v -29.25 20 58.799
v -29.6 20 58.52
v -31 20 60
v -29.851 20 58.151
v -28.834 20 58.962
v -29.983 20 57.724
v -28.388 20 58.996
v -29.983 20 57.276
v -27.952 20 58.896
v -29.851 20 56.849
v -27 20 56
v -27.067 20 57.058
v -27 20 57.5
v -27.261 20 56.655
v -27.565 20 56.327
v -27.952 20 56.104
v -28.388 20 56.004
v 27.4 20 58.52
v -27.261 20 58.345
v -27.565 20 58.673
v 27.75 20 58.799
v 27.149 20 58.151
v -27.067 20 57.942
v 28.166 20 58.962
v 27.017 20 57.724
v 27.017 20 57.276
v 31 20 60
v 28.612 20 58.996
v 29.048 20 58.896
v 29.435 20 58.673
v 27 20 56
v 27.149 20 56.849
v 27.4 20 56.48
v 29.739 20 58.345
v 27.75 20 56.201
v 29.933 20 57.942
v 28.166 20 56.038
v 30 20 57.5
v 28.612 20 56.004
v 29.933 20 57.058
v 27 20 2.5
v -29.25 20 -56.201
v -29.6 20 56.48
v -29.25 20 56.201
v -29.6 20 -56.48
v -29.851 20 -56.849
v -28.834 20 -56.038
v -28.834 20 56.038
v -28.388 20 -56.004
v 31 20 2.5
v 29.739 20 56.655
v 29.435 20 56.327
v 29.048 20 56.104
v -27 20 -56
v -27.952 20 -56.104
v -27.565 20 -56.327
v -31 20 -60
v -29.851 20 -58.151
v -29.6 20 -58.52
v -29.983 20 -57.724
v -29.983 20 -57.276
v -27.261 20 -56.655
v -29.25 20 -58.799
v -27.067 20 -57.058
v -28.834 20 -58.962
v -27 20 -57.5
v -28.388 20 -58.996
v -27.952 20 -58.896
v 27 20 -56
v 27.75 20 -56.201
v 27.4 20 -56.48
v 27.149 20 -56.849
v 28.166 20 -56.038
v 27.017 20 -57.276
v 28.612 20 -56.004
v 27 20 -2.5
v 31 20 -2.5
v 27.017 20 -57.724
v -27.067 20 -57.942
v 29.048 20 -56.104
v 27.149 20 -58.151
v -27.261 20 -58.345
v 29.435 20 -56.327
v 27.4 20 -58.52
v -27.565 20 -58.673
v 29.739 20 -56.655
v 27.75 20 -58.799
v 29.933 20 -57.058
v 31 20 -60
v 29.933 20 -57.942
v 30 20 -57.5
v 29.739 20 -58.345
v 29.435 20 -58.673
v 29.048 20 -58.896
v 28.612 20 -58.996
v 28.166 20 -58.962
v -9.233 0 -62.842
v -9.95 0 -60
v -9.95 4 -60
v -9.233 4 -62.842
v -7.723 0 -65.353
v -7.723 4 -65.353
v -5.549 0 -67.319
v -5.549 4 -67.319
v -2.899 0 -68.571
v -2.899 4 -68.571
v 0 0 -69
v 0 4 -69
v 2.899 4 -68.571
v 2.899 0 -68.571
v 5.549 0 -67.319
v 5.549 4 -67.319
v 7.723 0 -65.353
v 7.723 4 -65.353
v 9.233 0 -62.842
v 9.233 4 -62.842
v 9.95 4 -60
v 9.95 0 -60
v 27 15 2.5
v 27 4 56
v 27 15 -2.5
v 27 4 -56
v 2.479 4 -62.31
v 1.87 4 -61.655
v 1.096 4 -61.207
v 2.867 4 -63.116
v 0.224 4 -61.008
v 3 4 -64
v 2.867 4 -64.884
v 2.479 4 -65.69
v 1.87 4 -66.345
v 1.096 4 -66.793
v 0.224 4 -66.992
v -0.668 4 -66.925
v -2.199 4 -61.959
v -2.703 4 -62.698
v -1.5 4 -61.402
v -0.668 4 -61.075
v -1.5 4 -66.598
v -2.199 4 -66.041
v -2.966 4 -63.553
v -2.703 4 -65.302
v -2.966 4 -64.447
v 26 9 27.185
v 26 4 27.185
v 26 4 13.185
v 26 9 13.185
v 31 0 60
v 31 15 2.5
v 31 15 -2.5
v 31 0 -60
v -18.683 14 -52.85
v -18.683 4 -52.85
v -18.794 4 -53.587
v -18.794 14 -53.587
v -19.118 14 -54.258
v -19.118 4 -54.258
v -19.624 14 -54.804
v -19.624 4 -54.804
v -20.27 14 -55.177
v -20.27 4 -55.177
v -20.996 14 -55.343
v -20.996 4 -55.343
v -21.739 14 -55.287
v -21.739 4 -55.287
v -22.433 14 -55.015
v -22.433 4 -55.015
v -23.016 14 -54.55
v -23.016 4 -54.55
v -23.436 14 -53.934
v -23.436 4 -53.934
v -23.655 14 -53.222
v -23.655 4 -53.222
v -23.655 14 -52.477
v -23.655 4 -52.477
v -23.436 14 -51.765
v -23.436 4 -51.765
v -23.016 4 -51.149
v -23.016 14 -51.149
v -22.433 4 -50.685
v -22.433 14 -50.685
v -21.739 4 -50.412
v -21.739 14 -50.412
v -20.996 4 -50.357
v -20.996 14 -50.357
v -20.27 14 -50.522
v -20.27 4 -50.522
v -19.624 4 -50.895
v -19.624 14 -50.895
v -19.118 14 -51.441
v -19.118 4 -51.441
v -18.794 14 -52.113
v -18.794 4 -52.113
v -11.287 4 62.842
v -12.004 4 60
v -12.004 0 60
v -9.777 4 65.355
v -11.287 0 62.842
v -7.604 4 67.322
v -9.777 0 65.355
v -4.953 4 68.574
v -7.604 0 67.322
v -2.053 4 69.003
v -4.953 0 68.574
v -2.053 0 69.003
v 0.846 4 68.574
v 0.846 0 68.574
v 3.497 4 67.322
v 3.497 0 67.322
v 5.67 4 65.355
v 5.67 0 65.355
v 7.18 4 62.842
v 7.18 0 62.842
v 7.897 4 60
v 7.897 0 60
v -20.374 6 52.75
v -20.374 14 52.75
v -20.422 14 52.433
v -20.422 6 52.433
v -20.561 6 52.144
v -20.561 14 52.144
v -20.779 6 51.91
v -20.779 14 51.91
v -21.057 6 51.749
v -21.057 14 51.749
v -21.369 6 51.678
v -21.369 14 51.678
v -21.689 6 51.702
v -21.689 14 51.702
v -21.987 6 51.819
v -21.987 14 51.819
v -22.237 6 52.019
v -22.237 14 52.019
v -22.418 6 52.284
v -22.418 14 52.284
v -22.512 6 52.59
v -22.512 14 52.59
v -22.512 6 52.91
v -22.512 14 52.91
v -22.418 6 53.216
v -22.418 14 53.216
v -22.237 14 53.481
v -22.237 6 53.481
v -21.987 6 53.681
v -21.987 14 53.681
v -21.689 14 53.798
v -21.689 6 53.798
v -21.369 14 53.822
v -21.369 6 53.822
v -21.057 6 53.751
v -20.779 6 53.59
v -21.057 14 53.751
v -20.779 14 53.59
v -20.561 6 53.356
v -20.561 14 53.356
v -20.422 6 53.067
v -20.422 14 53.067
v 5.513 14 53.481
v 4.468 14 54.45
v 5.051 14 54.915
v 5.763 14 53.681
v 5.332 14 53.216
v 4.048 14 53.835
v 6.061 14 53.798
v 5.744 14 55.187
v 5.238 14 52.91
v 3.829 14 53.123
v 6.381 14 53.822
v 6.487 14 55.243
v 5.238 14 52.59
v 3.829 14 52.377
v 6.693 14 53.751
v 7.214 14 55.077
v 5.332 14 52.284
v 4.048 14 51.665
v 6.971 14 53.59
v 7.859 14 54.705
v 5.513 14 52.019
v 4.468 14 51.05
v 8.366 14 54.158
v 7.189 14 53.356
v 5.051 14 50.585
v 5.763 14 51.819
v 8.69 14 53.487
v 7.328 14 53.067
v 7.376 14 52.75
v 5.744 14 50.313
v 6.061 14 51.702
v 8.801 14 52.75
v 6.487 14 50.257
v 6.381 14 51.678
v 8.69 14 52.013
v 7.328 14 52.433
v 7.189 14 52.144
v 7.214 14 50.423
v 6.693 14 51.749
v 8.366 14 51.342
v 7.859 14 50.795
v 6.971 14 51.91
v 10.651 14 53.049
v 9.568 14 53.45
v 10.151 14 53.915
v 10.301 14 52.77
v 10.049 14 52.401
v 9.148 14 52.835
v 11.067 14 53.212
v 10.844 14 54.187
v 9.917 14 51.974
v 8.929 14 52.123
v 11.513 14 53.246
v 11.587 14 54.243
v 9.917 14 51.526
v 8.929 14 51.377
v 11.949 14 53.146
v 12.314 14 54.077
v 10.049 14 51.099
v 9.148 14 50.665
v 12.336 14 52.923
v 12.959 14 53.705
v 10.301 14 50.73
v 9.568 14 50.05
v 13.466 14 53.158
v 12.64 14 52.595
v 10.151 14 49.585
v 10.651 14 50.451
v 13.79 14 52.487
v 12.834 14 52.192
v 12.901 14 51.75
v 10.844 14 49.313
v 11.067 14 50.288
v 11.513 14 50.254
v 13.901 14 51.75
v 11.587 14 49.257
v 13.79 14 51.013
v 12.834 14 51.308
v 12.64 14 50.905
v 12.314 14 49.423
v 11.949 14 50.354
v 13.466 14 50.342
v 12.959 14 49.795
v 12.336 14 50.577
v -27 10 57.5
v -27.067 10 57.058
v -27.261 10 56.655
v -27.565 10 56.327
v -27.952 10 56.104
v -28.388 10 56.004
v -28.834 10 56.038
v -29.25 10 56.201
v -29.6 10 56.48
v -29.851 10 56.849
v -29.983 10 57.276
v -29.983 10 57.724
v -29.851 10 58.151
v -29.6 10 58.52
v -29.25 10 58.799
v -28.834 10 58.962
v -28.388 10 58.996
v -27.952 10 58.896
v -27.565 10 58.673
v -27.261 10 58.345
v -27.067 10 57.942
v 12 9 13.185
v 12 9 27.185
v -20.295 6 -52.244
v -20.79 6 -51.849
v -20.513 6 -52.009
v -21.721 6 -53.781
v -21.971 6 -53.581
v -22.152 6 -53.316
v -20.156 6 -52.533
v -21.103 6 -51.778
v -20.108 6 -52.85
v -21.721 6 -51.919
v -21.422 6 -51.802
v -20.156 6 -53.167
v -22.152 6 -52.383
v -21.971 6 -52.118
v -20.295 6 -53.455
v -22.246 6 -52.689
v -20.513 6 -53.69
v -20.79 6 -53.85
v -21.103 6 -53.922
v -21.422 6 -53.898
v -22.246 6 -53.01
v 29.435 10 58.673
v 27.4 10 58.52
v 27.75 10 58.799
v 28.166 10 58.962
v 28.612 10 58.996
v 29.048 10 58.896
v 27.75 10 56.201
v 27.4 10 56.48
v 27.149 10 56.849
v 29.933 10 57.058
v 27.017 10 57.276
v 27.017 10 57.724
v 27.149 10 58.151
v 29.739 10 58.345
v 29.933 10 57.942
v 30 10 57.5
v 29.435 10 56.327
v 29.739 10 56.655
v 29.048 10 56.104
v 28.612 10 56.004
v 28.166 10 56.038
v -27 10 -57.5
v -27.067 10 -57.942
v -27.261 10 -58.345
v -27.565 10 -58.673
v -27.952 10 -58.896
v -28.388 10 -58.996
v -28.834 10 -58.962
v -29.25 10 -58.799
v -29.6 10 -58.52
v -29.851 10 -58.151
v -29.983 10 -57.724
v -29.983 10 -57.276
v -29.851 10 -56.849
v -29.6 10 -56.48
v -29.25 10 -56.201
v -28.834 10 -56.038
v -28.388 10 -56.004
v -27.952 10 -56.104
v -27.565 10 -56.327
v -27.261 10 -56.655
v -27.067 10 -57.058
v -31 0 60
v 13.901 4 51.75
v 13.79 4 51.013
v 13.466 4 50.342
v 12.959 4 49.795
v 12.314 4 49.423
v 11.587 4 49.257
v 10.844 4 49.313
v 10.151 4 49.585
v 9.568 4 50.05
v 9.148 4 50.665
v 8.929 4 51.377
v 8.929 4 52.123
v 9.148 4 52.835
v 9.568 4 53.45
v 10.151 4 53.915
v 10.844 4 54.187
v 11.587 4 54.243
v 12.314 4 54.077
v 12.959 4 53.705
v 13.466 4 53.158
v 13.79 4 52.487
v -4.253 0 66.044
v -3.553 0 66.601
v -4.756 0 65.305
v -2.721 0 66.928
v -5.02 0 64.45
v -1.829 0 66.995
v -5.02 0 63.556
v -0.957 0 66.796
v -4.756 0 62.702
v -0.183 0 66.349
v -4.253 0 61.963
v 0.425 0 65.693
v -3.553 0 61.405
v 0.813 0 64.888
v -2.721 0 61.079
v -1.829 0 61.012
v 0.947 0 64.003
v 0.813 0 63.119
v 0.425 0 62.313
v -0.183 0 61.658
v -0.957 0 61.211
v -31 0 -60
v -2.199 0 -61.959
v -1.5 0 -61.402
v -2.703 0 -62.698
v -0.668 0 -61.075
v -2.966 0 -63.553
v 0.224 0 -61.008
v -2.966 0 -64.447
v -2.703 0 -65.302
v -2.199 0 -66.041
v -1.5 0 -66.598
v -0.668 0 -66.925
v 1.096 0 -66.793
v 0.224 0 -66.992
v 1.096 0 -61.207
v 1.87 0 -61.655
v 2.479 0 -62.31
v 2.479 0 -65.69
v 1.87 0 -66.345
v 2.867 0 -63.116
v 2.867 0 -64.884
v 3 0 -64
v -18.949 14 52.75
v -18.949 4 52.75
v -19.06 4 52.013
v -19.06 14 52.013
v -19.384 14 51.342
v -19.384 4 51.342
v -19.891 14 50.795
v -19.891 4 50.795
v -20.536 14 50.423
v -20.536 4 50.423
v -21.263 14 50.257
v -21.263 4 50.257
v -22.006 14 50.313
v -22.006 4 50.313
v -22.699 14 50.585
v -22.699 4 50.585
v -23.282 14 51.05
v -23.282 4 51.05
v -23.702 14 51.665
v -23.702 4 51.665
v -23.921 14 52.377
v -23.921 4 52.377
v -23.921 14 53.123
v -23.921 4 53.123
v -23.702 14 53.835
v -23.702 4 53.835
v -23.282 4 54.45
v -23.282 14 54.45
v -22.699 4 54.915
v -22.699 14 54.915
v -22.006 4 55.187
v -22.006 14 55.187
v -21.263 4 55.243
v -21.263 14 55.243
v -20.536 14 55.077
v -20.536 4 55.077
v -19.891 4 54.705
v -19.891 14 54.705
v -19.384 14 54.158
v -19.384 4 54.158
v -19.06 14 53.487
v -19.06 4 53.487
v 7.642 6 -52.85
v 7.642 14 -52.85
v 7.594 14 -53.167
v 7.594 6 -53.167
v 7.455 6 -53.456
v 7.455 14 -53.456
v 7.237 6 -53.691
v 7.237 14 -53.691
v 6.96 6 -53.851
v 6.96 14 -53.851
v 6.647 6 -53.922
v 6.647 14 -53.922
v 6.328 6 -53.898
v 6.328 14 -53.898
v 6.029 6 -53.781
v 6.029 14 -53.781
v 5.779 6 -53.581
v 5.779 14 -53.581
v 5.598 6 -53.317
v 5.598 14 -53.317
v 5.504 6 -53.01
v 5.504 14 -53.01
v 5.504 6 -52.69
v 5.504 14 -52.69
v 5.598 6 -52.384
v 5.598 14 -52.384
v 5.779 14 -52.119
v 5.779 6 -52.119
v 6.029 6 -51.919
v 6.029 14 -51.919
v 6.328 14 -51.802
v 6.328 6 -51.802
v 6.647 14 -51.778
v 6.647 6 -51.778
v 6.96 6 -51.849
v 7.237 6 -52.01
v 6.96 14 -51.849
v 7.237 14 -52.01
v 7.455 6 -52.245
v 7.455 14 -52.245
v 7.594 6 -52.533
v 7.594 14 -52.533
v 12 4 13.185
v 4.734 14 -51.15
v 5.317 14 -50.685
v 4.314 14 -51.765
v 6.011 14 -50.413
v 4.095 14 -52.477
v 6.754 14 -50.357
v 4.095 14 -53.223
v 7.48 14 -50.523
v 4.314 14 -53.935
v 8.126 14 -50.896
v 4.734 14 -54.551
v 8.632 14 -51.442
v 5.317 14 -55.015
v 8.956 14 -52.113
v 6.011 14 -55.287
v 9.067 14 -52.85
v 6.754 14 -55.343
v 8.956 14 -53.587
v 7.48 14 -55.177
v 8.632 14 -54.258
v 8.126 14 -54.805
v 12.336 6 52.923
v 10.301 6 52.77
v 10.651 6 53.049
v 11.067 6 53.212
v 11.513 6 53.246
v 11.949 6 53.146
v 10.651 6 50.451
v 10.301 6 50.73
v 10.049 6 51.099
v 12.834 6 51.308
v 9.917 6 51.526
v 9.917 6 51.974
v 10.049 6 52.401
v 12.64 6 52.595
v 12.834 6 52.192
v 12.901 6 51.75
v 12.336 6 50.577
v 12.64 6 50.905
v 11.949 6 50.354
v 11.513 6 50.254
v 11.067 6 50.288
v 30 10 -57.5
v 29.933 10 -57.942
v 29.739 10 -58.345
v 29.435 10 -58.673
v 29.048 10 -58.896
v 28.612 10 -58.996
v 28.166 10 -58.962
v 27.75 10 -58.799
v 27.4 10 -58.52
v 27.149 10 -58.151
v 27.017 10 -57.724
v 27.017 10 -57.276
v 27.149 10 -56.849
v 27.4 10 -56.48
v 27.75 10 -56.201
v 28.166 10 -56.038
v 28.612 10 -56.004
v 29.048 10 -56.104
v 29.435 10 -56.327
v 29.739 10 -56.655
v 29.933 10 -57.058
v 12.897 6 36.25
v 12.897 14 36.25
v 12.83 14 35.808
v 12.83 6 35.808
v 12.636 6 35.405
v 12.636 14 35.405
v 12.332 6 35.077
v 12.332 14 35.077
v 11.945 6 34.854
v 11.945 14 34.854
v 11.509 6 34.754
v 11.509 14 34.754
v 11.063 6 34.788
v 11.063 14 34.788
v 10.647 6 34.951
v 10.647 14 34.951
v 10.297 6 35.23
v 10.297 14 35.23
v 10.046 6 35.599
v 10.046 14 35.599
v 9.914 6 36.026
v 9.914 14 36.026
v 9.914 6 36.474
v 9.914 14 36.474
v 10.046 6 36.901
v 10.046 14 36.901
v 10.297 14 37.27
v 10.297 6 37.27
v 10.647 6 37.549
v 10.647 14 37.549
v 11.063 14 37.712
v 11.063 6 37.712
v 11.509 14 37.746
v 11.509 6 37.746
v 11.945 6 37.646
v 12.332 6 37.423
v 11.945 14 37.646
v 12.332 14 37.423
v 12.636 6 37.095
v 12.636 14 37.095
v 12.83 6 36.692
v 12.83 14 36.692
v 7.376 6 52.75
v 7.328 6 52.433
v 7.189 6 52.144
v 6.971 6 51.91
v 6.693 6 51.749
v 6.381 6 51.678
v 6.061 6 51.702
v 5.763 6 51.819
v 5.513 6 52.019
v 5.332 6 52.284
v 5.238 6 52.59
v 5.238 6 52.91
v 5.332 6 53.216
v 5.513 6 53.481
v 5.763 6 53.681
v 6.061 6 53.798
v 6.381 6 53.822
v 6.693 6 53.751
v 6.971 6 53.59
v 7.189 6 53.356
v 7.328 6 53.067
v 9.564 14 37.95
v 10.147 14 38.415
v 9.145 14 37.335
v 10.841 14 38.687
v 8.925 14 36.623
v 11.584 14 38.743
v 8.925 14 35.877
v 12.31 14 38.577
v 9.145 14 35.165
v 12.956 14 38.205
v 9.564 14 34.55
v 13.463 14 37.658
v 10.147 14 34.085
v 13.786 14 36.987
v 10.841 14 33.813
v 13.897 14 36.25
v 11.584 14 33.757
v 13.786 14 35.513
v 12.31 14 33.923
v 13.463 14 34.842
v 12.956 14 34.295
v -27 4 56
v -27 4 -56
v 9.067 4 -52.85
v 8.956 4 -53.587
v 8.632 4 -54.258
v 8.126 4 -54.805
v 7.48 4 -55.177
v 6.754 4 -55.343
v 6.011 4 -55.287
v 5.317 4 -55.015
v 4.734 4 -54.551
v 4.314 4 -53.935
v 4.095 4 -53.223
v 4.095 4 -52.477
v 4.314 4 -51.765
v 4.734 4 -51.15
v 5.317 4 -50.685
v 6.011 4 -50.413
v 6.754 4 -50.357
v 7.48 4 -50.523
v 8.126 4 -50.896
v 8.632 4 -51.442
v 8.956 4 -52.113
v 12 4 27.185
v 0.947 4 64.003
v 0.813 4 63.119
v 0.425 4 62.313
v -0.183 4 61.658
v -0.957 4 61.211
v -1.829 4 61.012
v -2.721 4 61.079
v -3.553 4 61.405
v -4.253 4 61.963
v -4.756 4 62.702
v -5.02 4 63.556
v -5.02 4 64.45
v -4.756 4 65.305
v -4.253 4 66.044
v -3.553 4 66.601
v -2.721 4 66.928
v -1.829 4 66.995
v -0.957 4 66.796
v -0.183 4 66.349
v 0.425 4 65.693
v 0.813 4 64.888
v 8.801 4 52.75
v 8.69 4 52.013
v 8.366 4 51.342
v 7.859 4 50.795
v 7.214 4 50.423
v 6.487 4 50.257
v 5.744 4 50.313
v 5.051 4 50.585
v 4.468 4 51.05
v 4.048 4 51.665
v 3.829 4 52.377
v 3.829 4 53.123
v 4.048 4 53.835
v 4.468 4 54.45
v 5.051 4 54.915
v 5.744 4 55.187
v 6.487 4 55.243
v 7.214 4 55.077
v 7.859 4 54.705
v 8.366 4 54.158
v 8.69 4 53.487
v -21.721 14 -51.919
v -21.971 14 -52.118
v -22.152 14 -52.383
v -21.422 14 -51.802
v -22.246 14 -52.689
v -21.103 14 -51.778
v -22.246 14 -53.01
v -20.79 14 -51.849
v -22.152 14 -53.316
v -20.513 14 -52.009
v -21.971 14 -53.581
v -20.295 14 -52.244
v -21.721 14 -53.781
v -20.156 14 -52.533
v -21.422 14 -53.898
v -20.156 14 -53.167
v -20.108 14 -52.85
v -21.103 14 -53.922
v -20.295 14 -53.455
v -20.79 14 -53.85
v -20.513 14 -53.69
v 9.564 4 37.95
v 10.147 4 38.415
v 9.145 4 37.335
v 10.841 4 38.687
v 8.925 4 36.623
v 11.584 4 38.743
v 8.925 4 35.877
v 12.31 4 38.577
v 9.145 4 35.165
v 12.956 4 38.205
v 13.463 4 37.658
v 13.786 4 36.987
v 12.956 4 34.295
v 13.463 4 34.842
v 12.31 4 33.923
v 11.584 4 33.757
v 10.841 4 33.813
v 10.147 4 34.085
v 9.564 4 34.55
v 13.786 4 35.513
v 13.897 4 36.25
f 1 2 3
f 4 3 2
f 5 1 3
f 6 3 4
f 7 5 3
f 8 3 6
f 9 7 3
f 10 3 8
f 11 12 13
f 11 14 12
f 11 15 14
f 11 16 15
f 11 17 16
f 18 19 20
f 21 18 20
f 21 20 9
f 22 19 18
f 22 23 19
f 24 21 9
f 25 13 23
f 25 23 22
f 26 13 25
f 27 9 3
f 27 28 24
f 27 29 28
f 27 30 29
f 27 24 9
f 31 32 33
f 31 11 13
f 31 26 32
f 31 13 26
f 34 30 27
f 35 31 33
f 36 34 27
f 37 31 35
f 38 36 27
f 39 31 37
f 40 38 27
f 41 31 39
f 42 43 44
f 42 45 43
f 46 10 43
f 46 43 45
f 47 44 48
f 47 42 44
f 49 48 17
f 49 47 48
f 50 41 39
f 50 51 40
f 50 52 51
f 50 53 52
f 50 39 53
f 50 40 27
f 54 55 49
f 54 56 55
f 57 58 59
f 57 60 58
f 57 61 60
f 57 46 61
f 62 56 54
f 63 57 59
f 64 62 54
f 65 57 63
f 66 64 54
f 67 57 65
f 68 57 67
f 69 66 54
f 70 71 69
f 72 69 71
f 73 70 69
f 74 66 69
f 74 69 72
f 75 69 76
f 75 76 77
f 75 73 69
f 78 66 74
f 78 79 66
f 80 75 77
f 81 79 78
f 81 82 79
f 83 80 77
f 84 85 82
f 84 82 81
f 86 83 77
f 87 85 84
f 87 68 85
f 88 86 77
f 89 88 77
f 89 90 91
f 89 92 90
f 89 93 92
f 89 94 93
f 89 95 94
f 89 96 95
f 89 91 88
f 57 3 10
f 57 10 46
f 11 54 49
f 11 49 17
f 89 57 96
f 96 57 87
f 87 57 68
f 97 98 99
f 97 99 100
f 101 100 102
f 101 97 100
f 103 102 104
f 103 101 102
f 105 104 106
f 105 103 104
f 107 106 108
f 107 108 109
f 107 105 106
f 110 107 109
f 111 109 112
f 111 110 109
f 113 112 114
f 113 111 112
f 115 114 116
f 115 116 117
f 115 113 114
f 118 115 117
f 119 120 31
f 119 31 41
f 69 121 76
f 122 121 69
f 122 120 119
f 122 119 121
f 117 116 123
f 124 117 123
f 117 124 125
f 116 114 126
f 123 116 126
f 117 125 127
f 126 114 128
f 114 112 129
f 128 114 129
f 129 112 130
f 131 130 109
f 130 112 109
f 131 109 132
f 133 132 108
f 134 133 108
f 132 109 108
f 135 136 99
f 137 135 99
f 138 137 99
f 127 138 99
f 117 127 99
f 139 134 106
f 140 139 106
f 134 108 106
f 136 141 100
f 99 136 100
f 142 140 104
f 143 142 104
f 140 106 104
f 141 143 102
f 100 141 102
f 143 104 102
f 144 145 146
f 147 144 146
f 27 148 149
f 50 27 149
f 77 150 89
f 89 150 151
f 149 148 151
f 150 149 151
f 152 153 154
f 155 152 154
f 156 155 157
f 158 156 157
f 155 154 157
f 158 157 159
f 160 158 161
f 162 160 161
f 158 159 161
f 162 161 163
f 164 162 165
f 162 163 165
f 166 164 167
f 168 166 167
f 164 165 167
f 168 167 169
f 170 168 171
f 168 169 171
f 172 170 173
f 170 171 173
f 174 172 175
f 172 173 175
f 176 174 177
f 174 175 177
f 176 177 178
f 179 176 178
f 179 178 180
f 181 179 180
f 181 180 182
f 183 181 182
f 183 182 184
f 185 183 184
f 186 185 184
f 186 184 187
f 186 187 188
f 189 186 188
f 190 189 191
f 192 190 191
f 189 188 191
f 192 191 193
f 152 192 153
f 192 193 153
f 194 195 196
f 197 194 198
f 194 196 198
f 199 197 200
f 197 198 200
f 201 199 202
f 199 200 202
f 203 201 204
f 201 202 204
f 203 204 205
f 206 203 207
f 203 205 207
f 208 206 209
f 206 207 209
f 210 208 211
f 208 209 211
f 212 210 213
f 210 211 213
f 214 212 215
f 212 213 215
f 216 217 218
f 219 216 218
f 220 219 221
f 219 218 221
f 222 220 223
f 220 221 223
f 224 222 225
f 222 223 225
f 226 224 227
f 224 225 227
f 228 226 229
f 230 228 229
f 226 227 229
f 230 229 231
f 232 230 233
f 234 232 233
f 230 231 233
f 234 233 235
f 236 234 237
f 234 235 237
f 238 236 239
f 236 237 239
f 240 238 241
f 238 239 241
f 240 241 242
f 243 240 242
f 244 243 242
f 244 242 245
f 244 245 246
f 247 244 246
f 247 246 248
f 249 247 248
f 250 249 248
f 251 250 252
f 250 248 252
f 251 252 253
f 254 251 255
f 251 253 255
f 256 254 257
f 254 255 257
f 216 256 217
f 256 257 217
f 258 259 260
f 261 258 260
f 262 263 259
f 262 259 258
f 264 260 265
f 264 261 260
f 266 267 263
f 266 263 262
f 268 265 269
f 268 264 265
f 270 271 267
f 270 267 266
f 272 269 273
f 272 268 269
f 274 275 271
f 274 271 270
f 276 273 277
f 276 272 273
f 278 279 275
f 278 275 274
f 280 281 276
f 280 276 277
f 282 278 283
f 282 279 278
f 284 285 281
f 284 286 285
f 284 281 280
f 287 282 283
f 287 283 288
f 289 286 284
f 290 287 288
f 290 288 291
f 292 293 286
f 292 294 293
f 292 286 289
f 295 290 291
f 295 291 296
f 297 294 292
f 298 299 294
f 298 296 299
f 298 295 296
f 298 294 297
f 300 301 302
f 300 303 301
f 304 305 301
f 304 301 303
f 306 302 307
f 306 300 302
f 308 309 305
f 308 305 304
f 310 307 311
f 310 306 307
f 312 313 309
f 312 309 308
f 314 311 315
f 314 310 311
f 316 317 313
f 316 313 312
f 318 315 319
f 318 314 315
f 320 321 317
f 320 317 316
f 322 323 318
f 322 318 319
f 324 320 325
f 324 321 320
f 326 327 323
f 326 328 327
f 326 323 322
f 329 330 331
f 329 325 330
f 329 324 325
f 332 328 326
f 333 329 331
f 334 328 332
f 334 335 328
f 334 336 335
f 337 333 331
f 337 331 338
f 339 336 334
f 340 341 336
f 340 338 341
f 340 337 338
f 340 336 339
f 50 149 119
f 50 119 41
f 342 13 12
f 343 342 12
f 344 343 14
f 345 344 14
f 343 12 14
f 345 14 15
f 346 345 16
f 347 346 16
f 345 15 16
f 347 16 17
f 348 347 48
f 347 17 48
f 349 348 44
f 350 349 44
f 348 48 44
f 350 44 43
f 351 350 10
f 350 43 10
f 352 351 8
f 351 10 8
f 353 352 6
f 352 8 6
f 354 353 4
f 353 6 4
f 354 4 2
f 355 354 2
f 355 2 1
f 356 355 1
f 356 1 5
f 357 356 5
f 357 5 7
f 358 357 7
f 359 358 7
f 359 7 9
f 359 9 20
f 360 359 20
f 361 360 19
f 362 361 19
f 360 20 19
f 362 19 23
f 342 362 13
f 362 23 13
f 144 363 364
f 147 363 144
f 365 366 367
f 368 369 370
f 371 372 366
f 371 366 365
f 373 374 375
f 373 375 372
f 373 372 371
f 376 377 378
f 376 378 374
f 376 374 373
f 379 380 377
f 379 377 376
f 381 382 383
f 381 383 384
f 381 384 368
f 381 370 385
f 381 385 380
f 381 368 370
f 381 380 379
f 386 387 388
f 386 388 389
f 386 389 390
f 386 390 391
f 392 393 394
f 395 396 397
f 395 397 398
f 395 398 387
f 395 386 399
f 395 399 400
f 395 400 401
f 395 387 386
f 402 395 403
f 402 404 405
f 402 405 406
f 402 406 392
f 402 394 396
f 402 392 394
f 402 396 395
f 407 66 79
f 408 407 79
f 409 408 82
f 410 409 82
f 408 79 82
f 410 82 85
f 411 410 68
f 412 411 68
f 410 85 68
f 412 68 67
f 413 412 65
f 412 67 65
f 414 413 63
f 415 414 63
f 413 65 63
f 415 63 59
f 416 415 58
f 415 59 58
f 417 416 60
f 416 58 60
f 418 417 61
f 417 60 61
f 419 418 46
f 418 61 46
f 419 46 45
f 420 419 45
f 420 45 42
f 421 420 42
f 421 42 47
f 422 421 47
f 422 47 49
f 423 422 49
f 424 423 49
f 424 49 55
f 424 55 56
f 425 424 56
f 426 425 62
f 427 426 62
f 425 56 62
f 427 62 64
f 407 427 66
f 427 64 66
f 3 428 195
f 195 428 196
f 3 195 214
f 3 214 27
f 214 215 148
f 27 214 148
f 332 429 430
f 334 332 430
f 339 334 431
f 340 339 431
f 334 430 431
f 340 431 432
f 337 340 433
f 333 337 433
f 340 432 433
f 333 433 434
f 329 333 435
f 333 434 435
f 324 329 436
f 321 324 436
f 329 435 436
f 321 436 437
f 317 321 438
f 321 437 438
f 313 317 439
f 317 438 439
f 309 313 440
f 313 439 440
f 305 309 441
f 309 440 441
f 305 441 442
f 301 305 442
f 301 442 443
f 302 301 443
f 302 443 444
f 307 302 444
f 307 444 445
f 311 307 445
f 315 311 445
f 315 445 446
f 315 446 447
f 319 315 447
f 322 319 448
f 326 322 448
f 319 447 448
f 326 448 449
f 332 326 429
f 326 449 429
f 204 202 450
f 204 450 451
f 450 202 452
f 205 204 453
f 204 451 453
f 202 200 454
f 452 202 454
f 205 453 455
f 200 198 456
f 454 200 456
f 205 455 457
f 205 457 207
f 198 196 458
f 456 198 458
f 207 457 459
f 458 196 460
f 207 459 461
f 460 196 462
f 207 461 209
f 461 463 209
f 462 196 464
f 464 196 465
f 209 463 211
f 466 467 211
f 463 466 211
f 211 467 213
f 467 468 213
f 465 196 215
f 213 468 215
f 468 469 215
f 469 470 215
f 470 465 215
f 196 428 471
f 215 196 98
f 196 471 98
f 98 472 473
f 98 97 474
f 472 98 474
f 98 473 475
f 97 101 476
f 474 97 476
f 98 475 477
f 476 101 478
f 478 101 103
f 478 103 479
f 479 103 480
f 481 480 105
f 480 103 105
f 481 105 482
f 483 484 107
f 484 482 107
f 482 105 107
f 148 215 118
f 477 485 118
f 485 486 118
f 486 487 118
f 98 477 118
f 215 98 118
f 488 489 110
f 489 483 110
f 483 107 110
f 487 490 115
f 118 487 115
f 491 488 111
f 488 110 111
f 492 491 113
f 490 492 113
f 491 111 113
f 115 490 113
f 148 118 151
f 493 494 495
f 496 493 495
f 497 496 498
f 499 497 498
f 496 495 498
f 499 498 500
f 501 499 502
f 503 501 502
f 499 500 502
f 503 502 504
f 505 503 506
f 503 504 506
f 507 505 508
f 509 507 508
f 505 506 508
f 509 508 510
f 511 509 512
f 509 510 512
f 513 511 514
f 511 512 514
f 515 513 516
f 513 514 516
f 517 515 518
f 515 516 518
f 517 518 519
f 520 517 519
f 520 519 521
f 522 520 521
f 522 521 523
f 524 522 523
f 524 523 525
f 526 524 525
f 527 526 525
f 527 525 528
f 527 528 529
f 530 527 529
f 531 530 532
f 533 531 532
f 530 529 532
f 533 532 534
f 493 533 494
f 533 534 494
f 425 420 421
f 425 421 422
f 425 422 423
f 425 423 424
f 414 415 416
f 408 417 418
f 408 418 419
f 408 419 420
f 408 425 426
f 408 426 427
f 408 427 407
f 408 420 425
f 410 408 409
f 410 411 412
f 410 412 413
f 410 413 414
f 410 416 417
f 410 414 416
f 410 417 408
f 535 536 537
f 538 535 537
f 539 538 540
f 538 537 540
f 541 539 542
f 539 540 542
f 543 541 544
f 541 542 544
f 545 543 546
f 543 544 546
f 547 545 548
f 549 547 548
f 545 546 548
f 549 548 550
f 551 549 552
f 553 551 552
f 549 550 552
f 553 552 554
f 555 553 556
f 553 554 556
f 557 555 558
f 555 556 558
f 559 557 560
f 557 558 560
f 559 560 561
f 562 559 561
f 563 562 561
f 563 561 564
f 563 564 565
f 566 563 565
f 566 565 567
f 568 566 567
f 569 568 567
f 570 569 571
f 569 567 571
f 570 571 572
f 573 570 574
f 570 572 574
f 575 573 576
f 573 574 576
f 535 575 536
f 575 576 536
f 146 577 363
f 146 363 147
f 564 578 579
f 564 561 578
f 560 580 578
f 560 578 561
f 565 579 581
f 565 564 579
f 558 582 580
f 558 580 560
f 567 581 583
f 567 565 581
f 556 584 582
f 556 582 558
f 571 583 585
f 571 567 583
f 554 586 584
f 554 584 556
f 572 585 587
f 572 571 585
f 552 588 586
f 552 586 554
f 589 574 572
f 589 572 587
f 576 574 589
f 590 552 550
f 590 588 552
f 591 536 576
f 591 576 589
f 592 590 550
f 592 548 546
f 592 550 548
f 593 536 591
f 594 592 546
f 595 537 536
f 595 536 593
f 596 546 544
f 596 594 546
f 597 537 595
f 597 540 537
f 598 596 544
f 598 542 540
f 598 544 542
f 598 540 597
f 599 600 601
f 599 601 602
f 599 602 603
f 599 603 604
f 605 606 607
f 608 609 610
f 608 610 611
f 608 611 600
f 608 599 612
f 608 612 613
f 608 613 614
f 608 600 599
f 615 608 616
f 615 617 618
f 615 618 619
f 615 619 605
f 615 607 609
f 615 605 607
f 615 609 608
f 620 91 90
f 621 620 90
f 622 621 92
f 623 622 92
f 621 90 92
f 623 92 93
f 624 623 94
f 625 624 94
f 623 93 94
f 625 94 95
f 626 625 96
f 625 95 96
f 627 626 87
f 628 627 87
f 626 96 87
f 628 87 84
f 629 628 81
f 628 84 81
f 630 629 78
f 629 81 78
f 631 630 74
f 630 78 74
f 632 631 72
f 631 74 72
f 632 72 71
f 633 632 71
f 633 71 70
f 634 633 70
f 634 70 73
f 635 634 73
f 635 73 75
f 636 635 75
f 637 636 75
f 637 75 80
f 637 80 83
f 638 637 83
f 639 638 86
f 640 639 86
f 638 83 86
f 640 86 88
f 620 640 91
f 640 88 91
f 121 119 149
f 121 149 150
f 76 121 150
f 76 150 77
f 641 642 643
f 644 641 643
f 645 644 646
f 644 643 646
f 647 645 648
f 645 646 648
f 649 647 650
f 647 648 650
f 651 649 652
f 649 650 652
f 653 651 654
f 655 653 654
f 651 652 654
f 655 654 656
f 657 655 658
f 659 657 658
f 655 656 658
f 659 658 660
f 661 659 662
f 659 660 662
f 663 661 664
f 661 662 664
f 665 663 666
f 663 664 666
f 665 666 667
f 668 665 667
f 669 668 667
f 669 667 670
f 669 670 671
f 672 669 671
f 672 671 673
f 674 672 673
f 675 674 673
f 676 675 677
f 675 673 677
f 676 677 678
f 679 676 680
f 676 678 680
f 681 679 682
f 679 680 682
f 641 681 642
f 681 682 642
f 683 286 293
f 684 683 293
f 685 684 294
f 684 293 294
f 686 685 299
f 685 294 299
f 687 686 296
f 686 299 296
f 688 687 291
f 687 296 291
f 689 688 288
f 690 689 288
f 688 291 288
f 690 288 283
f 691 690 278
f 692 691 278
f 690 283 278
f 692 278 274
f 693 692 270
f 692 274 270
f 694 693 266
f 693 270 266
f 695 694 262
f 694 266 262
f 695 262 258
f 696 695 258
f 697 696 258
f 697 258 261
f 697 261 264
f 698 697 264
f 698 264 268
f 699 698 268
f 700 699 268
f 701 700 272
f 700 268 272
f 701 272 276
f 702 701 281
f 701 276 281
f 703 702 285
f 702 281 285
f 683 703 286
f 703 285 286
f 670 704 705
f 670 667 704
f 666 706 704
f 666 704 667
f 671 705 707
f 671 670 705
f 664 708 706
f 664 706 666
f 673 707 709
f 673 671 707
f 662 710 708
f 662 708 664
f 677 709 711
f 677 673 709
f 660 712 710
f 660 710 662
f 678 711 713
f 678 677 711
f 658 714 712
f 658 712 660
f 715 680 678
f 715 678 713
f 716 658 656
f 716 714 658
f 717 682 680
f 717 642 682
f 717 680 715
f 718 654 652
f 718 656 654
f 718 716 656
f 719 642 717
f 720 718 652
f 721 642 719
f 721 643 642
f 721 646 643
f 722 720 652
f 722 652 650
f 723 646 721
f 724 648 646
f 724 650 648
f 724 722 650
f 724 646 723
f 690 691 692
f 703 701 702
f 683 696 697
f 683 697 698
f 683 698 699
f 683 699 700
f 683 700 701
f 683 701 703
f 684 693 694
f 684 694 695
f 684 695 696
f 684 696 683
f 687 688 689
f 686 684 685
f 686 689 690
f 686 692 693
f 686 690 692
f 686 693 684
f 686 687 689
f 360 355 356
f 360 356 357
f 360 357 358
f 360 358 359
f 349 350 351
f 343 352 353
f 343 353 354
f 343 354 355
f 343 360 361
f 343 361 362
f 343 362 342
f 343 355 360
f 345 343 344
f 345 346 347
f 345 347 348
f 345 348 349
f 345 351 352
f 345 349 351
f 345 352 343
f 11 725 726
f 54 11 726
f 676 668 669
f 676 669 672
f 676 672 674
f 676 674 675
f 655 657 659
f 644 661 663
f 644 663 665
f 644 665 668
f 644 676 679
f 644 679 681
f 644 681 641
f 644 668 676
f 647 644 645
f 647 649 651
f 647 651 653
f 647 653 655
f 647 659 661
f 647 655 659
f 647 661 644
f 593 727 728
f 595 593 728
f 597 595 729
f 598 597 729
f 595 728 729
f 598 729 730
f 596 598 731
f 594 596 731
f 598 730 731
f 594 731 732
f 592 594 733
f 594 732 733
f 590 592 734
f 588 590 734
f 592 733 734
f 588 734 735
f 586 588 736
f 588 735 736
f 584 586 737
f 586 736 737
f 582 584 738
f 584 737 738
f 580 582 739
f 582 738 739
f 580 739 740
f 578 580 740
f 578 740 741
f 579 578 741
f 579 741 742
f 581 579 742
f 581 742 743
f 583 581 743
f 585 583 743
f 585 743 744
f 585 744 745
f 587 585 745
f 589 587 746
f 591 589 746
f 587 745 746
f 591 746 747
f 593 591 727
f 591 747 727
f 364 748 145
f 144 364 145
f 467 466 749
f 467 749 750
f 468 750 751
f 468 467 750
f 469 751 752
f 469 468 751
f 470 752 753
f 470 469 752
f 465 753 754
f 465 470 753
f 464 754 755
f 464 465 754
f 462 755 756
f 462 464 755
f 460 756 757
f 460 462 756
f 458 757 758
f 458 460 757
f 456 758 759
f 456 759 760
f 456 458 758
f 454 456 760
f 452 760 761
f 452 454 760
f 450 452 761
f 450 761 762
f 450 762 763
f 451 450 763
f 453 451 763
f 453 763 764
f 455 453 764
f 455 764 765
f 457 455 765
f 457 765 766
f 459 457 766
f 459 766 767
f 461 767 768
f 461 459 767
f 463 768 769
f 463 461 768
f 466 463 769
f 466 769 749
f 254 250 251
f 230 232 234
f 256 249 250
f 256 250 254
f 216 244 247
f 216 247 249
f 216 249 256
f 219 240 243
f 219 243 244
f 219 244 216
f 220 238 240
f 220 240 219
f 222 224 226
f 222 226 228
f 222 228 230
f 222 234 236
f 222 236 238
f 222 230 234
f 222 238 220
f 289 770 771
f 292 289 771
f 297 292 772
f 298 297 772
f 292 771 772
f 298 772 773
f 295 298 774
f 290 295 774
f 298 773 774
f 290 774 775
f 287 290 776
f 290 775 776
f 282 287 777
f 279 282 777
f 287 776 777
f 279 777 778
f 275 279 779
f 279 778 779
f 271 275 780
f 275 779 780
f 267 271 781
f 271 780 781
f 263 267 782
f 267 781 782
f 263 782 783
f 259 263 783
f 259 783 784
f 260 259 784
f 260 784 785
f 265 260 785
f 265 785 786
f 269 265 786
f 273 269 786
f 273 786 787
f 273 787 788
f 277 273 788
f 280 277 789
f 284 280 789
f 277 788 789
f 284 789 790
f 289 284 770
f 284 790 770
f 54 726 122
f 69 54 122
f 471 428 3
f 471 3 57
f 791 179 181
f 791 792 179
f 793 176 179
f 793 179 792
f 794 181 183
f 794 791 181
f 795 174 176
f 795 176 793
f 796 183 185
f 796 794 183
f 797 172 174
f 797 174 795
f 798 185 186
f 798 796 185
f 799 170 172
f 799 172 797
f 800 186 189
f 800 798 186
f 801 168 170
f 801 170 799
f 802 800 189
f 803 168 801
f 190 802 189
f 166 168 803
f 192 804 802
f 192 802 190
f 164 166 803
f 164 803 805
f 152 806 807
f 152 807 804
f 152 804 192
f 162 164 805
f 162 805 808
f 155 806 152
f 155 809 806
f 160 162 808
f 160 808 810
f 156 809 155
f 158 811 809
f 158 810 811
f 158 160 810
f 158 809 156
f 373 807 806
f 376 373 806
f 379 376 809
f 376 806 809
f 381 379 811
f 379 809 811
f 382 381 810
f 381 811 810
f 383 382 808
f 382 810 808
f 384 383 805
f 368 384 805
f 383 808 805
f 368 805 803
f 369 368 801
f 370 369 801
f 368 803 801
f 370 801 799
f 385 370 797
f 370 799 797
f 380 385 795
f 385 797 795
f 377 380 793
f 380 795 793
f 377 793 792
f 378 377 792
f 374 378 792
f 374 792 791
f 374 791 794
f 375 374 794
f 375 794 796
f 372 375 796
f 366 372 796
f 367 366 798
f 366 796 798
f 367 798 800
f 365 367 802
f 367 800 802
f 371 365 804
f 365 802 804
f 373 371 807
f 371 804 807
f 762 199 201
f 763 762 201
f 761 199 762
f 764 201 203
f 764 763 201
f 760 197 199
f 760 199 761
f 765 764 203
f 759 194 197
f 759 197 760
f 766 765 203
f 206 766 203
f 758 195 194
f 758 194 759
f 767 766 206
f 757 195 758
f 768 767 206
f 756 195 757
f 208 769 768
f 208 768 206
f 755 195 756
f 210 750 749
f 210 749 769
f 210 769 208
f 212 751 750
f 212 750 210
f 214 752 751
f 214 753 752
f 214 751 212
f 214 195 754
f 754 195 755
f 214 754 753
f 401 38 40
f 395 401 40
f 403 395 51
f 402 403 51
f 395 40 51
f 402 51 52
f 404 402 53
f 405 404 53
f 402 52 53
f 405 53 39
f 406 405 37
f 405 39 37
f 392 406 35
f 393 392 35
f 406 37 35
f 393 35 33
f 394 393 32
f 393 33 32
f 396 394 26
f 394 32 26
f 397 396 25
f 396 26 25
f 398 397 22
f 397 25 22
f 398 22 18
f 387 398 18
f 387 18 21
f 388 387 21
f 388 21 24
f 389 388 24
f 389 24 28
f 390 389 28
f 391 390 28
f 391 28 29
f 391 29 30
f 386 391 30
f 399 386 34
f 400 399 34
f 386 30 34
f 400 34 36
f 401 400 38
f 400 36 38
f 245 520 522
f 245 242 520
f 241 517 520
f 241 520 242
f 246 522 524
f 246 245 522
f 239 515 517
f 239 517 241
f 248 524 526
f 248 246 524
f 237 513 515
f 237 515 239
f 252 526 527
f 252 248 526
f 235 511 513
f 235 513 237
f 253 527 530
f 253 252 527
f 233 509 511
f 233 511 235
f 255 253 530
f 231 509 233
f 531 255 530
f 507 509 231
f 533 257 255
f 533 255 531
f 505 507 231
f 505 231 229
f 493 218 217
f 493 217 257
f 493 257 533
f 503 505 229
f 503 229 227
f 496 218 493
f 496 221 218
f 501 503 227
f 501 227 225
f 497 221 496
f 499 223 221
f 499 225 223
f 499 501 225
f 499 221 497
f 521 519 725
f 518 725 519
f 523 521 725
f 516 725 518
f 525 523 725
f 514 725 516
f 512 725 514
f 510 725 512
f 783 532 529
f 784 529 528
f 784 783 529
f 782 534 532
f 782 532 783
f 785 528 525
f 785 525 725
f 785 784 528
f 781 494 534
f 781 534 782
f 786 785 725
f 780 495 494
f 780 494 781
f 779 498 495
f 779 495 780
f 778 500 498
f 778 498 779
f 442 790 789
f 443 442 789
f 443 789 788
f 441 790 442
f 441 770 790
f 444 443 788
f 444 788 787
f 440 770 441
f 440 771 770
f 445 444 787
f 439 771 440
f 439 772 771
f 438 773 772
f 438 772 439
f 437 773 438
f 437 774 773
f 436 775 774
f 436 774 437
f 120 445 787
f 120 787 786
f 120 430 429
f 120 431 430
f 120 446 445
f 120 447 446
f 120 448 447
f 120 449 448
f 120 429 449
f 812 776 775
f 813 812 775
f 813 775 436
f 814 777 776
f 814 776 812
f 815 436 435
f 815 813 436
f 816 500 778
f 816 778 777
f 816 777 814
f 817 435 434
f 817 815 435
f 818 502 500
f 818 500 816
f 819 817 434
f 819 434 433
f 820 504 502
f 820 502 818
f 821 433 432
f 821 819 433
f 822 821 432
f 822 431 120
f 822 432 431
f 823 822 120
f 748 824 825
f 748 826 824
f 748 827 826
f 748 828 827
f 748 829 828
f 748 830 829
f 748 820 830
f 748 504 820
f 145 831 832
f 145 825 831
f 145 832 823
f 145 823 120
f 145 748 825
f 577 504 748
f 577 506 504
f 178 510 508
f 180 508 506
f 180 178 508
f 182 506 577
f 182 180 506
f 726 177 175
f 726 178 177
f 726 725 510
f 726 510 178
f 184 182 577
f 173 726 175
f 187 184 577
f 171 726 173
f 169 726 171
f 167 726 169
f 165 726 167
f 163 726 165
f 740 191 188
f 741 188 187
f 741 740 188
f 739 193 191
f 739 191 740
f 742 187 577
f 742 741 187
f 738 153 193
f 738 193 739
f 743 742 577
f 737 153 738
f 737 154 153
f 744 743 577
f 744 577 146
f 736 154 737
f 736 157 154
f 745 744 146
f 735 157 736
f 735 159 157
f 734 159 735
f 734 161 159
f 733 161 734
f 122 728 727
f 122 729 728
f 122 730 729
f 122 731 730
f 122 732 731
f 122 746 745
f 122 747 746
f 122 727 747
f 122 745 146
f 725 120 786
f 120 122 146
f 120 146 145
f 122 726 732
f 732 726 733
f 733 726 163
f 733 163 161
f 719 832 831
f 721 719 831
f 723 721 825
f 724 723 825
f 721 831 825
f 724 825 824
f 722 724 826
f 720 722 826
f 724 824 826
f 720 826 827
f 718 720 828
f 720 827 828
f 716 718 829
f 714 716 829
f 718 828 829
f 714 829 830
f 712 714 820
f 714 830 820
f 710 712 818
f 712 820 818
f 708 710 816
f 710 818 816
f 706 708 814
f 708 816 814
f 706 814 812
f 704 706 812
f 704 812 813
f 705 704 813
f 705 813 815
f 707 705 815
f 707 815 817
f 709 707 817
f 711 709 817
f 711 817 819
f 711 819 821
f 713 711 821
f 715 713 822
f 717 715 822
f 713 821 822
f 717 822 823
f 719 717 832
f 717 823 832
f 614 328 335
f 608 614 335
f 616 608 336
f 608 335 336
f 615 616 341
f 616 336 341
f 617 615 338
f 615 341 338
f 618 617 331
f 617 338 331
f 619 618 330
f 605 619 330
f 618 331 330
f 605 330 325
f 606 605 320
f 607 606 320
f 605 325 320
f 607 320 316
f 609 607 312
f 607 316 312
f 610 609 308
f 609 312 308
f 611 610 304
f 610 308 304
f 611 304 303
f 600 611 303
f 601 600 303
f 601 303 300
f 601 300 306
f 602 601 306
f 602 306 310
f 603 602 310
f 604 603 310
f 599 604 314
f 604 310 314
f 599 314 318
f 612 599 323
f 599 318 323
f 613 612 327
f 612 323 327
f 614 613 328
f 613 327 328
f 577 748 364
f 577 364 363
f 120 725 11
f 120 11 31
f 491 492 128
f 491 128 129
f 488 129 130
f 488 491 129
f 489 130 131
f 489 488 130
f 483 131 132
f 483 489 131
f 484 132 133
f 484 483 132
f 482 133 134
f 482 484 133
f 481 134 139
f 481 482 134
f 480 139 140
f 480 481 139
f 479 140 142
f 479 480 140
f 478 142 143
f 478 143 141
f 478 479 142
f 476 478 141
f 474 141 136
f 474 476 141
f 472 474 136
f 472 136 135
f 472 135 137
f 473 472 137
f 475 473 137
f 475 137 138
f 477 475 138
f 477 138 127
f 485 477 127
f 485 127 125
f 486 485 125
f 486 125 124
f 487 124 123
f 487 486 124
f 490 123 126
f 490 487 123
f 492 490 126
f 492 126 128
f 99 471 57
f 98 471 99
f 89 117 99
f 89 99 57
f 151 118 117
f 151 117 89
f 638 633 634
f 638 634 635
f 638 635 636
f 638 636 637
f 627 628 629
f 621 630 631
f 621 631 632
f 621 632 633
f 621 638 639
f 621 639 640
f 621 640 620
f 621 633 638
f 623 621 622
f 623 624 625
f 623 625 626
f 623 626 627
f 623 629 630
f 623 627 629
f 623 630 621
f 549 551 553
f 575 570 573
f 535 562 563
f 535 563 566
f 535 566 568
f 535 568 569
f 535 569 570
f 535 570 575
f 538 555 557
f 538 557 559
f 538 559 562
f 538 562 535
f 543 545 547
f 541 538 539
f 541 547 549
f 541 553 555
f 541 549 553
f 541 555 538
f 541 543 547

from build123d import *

# Parameters (mm, degrees)
SKETCH1_W                      = 60
SKETCH1_H                      = 118
BOSS_EXTRUDE1_DEPTH            = 4
SKETCH2_R                      = 2.5
BOSS_EXTRUDE2_DEPTH            = 10
SKETCH3_R                      = 1.075
SKETCH3_R_2                    = 1.5
CUT_EXTRUDE1_DEPTH             = 8
SKETCH4_W                      = 14
SKETCH4_H                      = 14
BOSS_EXTRUDE3_DEPTH            = 5
SKETCH5_W                      = 60
SKETCH5_H                      = 118
SKETCH5_W_2                    = 54
SKETCH5_H_2                    = 112
BOSS_EXTRUDE4_DEPTH            = 16
SKETCH10_W                     = 62
SKETCH10_H                     = 120
SKETCH10_W_2                   = 60
SKETCH10_H_2                   = 118
BOSS_EXTRUDE7_DEPTH            = 20
SKETCH6_R                      = 1.5
CUT_EXTRUDE2_DEPTH             = 10
CUT_EXTRUDE3_REACH             = 63
SKETCH7_W                      = 5
SKETCH7_H                      = 10
CUT_EXTRUDE3_DIRECTION_2_DEPTH = 10
SKETCH8_R                      = 3
BOSS_EXTRUDE5_DEPTH            = 4


with BuildPart() as part:
    # Sketch1 → Boss-Extrude1 (new body)
    with BuildSketch(Plane(origin=(0, 0, 0), x_dir=(1, 0, 0), z_dir=(0, 1, 0))):
        Rectangle(SKETCH1_W, SKETCH1_H)
    extrude(amount=BOSS_EXTRUDE1_DEPTH)

    # Sketch2 → Boss-Extrude2 (add)
    with BuildSketch(Plane(origin=(0, 4, 0), x_dir=(1, 0, 0), z_dir=(0, 1, 0))):
        with Locations((-21.18316549, 52.849664436)):
            Circle(SKETCH2_R)
        with Locations((6.566834506, 52.850079416)):
            Circle(SKETCH2_R)
        with Locations((-21.449381738, -52.75)):
            Circle(SKETCH2_R)
        with Locations((6.300617416, -52.75)):
            Circle(SKETCH2_R)
        with Locations((11.396968897, -36.250000429)):
            Circle(SKETCH2_R)
        with Locations((11.400617416, -51.75)):
            Circle(SKETCH2_R)
    extrude(amount=BOSS_EXTRUDE2_DEPTH)

    # Sketch3 → Cut-Extrude1 (cut)
    with BuildSketch(Plane(origin=(0, 14, 0), x_dir=(1, 0, 0), z_dir=(0, 1, 0))):
        with Locations((-21.18316549, 52.849664436)):
            Circle(SKETCH3_R)
        with Locations((6.566834506, 52.850079416)):
            Circle(SKETCH3_R)
        with Locations((11.396968897, -36.250000429)):
            Circle(SKETCH3_R_2)
        with Locations((11.400617416, -51.75)):
            Circle(SKETCH3_R_2)
        with Locations((6.300617416, -52.75)):
            Circle(SKETCH3_R)
        with Locations((-21.449381738, -52.75)):
            Circle(SKETCH3_R)
    extrude(amount=-CUT_EXTRUDE1_DEPTH, mode=Mode.SUBTRACT)

    # Sketch4 → Boss-Extrude3 (add)
    with BuildSketch(Plane(origin=(0, 4, 0), x_dir=(1, 0, 0), z_dir=(0, 1, 0))):
        with Locations((19, -20.184694787)):
            Rectangle(SKETCH4_W, SKETCH4_H)
    extrude(amount=BOSS_EXTRUDE3_DEPTH)

    # Sketch5 → Boss-Extrude4 (add)
    with BuildSketch(Plane(origin=(0, 4, 0), x_dir=(1, 0, 0), z_dir=(0, 1, 0))):
        Rectangle(SKETCH5_W, SKETCH5_H)
        Rectangle(SKETCH5_W_2, SKETCH5_H_2, mode=Mode.SUBTRACT)
    extrude(amount=BOSS_EXTRUDE4_DEPTH)

    # Sketch10 → Boss-Extrude7 (add)
    with BuildSketch(Plane(origin=(0, 0, 0), x_dir=(1, 0, 0), z_dir=(0, 1, 0))):
        Rectangle(SKETCH10_W, SKETCH10_H)
        Rectangle(SKETCH10_W_2, SKETCH10_H_2, mode=Mode.SUBTRACT)
    extrude(amount=BOSS_EXTRUDE7_DEPTH)

    # Sketch6 → Cut-Extrude2 (cut)
    with BuildSketch(Plane(origin=(0, 20, 0), x_dir=(1, 0, 0), z_dir=(0, 1, 0))):
        with Locations((-28.5, 57.5)):
            Circle(SKETCH6_R)
        with Locations((28.5, 57.5)):
            Circle(SKETCH6_R)
        with Locations((-28.5, -57.5)):
            Circle(SKETCH6_R)
        with Locations((28.5, -57.5)):
            Circle(SKETCH6_R)
    extrude(amount=-CUT_EXTRUDE2_DEPTH, mode=Mode.SUBTRACT)

    # Sketch7 → Cut-Extrude3 (cut, up to next)
    with BuildSketch(Plane(origin=(30, 0, 0), x_dir=(0, 0, -1), z_dir=(1, 0, 0)), mode=Mode.PRIVATE) as cut_extrude3_sk1:
        with Locations((0, 20)):
            Rectangle(SKETCH7_W, SKETCH7_H)
    cut_extrude3_tool1 = extrude(cut_extrude3_sk1.sketch, amount=-CUT_EXTRUDE3_REACH, mode=Mode.PRIVATE) & part.part
    add(cut_extrude3_tool1.solids().sort_by_distance((30, 20, 0))[0], mode=Mode.SUBTRACT)

    # Sketch7 → Cut-Extrude3 direction 2 (cut)
    with BuildSketch(Plane(origin=(30, 0, 0), x_dir=(0, 0, -1), z_dir=(1, 0, 0))):
        with Locations((0, 20)):
            Rectangle(SKETCH7_W, SKETCH7_H)
    extrude(amount=CUT_EXTRUDE3_DIRECTION_2_DEPTH, mode=Mode.SUBTRACT)

    # Sketch8 → Boss-Extrude5 (add)
    with BuildSketch(Plane(origin=(0, 0, 0), x_dir=(1, 0, 0), z_dir=(0, 1, 0))):
        with BuildLine():
            Line((10, 59), (-10, 59))
            ThreePointArc((-10, 59), (0, 69), (10, 59))
        make_face()
        with Locations((0, 64)):
            Circle(SKETCH8_R, mode=Mode.SUBTRACT)
        with BuildLine():
            Line((7.946608606, -59.003318261), (-12.053391394, -59.003318261))
            ThreePointArc((-12.053391394, -59.003318261), (-2.053391394, -69.003318261), (7.946608606, -59.003318261))
        make_face()
        with Locations((-2.053391394, -64.003318261)):
            Circle(SKETCH8_R, mode=Mode.SUBTRACT)
    extrude(amount=BOSS_EXTRUDE5_DEPTH)


solid = part.part
